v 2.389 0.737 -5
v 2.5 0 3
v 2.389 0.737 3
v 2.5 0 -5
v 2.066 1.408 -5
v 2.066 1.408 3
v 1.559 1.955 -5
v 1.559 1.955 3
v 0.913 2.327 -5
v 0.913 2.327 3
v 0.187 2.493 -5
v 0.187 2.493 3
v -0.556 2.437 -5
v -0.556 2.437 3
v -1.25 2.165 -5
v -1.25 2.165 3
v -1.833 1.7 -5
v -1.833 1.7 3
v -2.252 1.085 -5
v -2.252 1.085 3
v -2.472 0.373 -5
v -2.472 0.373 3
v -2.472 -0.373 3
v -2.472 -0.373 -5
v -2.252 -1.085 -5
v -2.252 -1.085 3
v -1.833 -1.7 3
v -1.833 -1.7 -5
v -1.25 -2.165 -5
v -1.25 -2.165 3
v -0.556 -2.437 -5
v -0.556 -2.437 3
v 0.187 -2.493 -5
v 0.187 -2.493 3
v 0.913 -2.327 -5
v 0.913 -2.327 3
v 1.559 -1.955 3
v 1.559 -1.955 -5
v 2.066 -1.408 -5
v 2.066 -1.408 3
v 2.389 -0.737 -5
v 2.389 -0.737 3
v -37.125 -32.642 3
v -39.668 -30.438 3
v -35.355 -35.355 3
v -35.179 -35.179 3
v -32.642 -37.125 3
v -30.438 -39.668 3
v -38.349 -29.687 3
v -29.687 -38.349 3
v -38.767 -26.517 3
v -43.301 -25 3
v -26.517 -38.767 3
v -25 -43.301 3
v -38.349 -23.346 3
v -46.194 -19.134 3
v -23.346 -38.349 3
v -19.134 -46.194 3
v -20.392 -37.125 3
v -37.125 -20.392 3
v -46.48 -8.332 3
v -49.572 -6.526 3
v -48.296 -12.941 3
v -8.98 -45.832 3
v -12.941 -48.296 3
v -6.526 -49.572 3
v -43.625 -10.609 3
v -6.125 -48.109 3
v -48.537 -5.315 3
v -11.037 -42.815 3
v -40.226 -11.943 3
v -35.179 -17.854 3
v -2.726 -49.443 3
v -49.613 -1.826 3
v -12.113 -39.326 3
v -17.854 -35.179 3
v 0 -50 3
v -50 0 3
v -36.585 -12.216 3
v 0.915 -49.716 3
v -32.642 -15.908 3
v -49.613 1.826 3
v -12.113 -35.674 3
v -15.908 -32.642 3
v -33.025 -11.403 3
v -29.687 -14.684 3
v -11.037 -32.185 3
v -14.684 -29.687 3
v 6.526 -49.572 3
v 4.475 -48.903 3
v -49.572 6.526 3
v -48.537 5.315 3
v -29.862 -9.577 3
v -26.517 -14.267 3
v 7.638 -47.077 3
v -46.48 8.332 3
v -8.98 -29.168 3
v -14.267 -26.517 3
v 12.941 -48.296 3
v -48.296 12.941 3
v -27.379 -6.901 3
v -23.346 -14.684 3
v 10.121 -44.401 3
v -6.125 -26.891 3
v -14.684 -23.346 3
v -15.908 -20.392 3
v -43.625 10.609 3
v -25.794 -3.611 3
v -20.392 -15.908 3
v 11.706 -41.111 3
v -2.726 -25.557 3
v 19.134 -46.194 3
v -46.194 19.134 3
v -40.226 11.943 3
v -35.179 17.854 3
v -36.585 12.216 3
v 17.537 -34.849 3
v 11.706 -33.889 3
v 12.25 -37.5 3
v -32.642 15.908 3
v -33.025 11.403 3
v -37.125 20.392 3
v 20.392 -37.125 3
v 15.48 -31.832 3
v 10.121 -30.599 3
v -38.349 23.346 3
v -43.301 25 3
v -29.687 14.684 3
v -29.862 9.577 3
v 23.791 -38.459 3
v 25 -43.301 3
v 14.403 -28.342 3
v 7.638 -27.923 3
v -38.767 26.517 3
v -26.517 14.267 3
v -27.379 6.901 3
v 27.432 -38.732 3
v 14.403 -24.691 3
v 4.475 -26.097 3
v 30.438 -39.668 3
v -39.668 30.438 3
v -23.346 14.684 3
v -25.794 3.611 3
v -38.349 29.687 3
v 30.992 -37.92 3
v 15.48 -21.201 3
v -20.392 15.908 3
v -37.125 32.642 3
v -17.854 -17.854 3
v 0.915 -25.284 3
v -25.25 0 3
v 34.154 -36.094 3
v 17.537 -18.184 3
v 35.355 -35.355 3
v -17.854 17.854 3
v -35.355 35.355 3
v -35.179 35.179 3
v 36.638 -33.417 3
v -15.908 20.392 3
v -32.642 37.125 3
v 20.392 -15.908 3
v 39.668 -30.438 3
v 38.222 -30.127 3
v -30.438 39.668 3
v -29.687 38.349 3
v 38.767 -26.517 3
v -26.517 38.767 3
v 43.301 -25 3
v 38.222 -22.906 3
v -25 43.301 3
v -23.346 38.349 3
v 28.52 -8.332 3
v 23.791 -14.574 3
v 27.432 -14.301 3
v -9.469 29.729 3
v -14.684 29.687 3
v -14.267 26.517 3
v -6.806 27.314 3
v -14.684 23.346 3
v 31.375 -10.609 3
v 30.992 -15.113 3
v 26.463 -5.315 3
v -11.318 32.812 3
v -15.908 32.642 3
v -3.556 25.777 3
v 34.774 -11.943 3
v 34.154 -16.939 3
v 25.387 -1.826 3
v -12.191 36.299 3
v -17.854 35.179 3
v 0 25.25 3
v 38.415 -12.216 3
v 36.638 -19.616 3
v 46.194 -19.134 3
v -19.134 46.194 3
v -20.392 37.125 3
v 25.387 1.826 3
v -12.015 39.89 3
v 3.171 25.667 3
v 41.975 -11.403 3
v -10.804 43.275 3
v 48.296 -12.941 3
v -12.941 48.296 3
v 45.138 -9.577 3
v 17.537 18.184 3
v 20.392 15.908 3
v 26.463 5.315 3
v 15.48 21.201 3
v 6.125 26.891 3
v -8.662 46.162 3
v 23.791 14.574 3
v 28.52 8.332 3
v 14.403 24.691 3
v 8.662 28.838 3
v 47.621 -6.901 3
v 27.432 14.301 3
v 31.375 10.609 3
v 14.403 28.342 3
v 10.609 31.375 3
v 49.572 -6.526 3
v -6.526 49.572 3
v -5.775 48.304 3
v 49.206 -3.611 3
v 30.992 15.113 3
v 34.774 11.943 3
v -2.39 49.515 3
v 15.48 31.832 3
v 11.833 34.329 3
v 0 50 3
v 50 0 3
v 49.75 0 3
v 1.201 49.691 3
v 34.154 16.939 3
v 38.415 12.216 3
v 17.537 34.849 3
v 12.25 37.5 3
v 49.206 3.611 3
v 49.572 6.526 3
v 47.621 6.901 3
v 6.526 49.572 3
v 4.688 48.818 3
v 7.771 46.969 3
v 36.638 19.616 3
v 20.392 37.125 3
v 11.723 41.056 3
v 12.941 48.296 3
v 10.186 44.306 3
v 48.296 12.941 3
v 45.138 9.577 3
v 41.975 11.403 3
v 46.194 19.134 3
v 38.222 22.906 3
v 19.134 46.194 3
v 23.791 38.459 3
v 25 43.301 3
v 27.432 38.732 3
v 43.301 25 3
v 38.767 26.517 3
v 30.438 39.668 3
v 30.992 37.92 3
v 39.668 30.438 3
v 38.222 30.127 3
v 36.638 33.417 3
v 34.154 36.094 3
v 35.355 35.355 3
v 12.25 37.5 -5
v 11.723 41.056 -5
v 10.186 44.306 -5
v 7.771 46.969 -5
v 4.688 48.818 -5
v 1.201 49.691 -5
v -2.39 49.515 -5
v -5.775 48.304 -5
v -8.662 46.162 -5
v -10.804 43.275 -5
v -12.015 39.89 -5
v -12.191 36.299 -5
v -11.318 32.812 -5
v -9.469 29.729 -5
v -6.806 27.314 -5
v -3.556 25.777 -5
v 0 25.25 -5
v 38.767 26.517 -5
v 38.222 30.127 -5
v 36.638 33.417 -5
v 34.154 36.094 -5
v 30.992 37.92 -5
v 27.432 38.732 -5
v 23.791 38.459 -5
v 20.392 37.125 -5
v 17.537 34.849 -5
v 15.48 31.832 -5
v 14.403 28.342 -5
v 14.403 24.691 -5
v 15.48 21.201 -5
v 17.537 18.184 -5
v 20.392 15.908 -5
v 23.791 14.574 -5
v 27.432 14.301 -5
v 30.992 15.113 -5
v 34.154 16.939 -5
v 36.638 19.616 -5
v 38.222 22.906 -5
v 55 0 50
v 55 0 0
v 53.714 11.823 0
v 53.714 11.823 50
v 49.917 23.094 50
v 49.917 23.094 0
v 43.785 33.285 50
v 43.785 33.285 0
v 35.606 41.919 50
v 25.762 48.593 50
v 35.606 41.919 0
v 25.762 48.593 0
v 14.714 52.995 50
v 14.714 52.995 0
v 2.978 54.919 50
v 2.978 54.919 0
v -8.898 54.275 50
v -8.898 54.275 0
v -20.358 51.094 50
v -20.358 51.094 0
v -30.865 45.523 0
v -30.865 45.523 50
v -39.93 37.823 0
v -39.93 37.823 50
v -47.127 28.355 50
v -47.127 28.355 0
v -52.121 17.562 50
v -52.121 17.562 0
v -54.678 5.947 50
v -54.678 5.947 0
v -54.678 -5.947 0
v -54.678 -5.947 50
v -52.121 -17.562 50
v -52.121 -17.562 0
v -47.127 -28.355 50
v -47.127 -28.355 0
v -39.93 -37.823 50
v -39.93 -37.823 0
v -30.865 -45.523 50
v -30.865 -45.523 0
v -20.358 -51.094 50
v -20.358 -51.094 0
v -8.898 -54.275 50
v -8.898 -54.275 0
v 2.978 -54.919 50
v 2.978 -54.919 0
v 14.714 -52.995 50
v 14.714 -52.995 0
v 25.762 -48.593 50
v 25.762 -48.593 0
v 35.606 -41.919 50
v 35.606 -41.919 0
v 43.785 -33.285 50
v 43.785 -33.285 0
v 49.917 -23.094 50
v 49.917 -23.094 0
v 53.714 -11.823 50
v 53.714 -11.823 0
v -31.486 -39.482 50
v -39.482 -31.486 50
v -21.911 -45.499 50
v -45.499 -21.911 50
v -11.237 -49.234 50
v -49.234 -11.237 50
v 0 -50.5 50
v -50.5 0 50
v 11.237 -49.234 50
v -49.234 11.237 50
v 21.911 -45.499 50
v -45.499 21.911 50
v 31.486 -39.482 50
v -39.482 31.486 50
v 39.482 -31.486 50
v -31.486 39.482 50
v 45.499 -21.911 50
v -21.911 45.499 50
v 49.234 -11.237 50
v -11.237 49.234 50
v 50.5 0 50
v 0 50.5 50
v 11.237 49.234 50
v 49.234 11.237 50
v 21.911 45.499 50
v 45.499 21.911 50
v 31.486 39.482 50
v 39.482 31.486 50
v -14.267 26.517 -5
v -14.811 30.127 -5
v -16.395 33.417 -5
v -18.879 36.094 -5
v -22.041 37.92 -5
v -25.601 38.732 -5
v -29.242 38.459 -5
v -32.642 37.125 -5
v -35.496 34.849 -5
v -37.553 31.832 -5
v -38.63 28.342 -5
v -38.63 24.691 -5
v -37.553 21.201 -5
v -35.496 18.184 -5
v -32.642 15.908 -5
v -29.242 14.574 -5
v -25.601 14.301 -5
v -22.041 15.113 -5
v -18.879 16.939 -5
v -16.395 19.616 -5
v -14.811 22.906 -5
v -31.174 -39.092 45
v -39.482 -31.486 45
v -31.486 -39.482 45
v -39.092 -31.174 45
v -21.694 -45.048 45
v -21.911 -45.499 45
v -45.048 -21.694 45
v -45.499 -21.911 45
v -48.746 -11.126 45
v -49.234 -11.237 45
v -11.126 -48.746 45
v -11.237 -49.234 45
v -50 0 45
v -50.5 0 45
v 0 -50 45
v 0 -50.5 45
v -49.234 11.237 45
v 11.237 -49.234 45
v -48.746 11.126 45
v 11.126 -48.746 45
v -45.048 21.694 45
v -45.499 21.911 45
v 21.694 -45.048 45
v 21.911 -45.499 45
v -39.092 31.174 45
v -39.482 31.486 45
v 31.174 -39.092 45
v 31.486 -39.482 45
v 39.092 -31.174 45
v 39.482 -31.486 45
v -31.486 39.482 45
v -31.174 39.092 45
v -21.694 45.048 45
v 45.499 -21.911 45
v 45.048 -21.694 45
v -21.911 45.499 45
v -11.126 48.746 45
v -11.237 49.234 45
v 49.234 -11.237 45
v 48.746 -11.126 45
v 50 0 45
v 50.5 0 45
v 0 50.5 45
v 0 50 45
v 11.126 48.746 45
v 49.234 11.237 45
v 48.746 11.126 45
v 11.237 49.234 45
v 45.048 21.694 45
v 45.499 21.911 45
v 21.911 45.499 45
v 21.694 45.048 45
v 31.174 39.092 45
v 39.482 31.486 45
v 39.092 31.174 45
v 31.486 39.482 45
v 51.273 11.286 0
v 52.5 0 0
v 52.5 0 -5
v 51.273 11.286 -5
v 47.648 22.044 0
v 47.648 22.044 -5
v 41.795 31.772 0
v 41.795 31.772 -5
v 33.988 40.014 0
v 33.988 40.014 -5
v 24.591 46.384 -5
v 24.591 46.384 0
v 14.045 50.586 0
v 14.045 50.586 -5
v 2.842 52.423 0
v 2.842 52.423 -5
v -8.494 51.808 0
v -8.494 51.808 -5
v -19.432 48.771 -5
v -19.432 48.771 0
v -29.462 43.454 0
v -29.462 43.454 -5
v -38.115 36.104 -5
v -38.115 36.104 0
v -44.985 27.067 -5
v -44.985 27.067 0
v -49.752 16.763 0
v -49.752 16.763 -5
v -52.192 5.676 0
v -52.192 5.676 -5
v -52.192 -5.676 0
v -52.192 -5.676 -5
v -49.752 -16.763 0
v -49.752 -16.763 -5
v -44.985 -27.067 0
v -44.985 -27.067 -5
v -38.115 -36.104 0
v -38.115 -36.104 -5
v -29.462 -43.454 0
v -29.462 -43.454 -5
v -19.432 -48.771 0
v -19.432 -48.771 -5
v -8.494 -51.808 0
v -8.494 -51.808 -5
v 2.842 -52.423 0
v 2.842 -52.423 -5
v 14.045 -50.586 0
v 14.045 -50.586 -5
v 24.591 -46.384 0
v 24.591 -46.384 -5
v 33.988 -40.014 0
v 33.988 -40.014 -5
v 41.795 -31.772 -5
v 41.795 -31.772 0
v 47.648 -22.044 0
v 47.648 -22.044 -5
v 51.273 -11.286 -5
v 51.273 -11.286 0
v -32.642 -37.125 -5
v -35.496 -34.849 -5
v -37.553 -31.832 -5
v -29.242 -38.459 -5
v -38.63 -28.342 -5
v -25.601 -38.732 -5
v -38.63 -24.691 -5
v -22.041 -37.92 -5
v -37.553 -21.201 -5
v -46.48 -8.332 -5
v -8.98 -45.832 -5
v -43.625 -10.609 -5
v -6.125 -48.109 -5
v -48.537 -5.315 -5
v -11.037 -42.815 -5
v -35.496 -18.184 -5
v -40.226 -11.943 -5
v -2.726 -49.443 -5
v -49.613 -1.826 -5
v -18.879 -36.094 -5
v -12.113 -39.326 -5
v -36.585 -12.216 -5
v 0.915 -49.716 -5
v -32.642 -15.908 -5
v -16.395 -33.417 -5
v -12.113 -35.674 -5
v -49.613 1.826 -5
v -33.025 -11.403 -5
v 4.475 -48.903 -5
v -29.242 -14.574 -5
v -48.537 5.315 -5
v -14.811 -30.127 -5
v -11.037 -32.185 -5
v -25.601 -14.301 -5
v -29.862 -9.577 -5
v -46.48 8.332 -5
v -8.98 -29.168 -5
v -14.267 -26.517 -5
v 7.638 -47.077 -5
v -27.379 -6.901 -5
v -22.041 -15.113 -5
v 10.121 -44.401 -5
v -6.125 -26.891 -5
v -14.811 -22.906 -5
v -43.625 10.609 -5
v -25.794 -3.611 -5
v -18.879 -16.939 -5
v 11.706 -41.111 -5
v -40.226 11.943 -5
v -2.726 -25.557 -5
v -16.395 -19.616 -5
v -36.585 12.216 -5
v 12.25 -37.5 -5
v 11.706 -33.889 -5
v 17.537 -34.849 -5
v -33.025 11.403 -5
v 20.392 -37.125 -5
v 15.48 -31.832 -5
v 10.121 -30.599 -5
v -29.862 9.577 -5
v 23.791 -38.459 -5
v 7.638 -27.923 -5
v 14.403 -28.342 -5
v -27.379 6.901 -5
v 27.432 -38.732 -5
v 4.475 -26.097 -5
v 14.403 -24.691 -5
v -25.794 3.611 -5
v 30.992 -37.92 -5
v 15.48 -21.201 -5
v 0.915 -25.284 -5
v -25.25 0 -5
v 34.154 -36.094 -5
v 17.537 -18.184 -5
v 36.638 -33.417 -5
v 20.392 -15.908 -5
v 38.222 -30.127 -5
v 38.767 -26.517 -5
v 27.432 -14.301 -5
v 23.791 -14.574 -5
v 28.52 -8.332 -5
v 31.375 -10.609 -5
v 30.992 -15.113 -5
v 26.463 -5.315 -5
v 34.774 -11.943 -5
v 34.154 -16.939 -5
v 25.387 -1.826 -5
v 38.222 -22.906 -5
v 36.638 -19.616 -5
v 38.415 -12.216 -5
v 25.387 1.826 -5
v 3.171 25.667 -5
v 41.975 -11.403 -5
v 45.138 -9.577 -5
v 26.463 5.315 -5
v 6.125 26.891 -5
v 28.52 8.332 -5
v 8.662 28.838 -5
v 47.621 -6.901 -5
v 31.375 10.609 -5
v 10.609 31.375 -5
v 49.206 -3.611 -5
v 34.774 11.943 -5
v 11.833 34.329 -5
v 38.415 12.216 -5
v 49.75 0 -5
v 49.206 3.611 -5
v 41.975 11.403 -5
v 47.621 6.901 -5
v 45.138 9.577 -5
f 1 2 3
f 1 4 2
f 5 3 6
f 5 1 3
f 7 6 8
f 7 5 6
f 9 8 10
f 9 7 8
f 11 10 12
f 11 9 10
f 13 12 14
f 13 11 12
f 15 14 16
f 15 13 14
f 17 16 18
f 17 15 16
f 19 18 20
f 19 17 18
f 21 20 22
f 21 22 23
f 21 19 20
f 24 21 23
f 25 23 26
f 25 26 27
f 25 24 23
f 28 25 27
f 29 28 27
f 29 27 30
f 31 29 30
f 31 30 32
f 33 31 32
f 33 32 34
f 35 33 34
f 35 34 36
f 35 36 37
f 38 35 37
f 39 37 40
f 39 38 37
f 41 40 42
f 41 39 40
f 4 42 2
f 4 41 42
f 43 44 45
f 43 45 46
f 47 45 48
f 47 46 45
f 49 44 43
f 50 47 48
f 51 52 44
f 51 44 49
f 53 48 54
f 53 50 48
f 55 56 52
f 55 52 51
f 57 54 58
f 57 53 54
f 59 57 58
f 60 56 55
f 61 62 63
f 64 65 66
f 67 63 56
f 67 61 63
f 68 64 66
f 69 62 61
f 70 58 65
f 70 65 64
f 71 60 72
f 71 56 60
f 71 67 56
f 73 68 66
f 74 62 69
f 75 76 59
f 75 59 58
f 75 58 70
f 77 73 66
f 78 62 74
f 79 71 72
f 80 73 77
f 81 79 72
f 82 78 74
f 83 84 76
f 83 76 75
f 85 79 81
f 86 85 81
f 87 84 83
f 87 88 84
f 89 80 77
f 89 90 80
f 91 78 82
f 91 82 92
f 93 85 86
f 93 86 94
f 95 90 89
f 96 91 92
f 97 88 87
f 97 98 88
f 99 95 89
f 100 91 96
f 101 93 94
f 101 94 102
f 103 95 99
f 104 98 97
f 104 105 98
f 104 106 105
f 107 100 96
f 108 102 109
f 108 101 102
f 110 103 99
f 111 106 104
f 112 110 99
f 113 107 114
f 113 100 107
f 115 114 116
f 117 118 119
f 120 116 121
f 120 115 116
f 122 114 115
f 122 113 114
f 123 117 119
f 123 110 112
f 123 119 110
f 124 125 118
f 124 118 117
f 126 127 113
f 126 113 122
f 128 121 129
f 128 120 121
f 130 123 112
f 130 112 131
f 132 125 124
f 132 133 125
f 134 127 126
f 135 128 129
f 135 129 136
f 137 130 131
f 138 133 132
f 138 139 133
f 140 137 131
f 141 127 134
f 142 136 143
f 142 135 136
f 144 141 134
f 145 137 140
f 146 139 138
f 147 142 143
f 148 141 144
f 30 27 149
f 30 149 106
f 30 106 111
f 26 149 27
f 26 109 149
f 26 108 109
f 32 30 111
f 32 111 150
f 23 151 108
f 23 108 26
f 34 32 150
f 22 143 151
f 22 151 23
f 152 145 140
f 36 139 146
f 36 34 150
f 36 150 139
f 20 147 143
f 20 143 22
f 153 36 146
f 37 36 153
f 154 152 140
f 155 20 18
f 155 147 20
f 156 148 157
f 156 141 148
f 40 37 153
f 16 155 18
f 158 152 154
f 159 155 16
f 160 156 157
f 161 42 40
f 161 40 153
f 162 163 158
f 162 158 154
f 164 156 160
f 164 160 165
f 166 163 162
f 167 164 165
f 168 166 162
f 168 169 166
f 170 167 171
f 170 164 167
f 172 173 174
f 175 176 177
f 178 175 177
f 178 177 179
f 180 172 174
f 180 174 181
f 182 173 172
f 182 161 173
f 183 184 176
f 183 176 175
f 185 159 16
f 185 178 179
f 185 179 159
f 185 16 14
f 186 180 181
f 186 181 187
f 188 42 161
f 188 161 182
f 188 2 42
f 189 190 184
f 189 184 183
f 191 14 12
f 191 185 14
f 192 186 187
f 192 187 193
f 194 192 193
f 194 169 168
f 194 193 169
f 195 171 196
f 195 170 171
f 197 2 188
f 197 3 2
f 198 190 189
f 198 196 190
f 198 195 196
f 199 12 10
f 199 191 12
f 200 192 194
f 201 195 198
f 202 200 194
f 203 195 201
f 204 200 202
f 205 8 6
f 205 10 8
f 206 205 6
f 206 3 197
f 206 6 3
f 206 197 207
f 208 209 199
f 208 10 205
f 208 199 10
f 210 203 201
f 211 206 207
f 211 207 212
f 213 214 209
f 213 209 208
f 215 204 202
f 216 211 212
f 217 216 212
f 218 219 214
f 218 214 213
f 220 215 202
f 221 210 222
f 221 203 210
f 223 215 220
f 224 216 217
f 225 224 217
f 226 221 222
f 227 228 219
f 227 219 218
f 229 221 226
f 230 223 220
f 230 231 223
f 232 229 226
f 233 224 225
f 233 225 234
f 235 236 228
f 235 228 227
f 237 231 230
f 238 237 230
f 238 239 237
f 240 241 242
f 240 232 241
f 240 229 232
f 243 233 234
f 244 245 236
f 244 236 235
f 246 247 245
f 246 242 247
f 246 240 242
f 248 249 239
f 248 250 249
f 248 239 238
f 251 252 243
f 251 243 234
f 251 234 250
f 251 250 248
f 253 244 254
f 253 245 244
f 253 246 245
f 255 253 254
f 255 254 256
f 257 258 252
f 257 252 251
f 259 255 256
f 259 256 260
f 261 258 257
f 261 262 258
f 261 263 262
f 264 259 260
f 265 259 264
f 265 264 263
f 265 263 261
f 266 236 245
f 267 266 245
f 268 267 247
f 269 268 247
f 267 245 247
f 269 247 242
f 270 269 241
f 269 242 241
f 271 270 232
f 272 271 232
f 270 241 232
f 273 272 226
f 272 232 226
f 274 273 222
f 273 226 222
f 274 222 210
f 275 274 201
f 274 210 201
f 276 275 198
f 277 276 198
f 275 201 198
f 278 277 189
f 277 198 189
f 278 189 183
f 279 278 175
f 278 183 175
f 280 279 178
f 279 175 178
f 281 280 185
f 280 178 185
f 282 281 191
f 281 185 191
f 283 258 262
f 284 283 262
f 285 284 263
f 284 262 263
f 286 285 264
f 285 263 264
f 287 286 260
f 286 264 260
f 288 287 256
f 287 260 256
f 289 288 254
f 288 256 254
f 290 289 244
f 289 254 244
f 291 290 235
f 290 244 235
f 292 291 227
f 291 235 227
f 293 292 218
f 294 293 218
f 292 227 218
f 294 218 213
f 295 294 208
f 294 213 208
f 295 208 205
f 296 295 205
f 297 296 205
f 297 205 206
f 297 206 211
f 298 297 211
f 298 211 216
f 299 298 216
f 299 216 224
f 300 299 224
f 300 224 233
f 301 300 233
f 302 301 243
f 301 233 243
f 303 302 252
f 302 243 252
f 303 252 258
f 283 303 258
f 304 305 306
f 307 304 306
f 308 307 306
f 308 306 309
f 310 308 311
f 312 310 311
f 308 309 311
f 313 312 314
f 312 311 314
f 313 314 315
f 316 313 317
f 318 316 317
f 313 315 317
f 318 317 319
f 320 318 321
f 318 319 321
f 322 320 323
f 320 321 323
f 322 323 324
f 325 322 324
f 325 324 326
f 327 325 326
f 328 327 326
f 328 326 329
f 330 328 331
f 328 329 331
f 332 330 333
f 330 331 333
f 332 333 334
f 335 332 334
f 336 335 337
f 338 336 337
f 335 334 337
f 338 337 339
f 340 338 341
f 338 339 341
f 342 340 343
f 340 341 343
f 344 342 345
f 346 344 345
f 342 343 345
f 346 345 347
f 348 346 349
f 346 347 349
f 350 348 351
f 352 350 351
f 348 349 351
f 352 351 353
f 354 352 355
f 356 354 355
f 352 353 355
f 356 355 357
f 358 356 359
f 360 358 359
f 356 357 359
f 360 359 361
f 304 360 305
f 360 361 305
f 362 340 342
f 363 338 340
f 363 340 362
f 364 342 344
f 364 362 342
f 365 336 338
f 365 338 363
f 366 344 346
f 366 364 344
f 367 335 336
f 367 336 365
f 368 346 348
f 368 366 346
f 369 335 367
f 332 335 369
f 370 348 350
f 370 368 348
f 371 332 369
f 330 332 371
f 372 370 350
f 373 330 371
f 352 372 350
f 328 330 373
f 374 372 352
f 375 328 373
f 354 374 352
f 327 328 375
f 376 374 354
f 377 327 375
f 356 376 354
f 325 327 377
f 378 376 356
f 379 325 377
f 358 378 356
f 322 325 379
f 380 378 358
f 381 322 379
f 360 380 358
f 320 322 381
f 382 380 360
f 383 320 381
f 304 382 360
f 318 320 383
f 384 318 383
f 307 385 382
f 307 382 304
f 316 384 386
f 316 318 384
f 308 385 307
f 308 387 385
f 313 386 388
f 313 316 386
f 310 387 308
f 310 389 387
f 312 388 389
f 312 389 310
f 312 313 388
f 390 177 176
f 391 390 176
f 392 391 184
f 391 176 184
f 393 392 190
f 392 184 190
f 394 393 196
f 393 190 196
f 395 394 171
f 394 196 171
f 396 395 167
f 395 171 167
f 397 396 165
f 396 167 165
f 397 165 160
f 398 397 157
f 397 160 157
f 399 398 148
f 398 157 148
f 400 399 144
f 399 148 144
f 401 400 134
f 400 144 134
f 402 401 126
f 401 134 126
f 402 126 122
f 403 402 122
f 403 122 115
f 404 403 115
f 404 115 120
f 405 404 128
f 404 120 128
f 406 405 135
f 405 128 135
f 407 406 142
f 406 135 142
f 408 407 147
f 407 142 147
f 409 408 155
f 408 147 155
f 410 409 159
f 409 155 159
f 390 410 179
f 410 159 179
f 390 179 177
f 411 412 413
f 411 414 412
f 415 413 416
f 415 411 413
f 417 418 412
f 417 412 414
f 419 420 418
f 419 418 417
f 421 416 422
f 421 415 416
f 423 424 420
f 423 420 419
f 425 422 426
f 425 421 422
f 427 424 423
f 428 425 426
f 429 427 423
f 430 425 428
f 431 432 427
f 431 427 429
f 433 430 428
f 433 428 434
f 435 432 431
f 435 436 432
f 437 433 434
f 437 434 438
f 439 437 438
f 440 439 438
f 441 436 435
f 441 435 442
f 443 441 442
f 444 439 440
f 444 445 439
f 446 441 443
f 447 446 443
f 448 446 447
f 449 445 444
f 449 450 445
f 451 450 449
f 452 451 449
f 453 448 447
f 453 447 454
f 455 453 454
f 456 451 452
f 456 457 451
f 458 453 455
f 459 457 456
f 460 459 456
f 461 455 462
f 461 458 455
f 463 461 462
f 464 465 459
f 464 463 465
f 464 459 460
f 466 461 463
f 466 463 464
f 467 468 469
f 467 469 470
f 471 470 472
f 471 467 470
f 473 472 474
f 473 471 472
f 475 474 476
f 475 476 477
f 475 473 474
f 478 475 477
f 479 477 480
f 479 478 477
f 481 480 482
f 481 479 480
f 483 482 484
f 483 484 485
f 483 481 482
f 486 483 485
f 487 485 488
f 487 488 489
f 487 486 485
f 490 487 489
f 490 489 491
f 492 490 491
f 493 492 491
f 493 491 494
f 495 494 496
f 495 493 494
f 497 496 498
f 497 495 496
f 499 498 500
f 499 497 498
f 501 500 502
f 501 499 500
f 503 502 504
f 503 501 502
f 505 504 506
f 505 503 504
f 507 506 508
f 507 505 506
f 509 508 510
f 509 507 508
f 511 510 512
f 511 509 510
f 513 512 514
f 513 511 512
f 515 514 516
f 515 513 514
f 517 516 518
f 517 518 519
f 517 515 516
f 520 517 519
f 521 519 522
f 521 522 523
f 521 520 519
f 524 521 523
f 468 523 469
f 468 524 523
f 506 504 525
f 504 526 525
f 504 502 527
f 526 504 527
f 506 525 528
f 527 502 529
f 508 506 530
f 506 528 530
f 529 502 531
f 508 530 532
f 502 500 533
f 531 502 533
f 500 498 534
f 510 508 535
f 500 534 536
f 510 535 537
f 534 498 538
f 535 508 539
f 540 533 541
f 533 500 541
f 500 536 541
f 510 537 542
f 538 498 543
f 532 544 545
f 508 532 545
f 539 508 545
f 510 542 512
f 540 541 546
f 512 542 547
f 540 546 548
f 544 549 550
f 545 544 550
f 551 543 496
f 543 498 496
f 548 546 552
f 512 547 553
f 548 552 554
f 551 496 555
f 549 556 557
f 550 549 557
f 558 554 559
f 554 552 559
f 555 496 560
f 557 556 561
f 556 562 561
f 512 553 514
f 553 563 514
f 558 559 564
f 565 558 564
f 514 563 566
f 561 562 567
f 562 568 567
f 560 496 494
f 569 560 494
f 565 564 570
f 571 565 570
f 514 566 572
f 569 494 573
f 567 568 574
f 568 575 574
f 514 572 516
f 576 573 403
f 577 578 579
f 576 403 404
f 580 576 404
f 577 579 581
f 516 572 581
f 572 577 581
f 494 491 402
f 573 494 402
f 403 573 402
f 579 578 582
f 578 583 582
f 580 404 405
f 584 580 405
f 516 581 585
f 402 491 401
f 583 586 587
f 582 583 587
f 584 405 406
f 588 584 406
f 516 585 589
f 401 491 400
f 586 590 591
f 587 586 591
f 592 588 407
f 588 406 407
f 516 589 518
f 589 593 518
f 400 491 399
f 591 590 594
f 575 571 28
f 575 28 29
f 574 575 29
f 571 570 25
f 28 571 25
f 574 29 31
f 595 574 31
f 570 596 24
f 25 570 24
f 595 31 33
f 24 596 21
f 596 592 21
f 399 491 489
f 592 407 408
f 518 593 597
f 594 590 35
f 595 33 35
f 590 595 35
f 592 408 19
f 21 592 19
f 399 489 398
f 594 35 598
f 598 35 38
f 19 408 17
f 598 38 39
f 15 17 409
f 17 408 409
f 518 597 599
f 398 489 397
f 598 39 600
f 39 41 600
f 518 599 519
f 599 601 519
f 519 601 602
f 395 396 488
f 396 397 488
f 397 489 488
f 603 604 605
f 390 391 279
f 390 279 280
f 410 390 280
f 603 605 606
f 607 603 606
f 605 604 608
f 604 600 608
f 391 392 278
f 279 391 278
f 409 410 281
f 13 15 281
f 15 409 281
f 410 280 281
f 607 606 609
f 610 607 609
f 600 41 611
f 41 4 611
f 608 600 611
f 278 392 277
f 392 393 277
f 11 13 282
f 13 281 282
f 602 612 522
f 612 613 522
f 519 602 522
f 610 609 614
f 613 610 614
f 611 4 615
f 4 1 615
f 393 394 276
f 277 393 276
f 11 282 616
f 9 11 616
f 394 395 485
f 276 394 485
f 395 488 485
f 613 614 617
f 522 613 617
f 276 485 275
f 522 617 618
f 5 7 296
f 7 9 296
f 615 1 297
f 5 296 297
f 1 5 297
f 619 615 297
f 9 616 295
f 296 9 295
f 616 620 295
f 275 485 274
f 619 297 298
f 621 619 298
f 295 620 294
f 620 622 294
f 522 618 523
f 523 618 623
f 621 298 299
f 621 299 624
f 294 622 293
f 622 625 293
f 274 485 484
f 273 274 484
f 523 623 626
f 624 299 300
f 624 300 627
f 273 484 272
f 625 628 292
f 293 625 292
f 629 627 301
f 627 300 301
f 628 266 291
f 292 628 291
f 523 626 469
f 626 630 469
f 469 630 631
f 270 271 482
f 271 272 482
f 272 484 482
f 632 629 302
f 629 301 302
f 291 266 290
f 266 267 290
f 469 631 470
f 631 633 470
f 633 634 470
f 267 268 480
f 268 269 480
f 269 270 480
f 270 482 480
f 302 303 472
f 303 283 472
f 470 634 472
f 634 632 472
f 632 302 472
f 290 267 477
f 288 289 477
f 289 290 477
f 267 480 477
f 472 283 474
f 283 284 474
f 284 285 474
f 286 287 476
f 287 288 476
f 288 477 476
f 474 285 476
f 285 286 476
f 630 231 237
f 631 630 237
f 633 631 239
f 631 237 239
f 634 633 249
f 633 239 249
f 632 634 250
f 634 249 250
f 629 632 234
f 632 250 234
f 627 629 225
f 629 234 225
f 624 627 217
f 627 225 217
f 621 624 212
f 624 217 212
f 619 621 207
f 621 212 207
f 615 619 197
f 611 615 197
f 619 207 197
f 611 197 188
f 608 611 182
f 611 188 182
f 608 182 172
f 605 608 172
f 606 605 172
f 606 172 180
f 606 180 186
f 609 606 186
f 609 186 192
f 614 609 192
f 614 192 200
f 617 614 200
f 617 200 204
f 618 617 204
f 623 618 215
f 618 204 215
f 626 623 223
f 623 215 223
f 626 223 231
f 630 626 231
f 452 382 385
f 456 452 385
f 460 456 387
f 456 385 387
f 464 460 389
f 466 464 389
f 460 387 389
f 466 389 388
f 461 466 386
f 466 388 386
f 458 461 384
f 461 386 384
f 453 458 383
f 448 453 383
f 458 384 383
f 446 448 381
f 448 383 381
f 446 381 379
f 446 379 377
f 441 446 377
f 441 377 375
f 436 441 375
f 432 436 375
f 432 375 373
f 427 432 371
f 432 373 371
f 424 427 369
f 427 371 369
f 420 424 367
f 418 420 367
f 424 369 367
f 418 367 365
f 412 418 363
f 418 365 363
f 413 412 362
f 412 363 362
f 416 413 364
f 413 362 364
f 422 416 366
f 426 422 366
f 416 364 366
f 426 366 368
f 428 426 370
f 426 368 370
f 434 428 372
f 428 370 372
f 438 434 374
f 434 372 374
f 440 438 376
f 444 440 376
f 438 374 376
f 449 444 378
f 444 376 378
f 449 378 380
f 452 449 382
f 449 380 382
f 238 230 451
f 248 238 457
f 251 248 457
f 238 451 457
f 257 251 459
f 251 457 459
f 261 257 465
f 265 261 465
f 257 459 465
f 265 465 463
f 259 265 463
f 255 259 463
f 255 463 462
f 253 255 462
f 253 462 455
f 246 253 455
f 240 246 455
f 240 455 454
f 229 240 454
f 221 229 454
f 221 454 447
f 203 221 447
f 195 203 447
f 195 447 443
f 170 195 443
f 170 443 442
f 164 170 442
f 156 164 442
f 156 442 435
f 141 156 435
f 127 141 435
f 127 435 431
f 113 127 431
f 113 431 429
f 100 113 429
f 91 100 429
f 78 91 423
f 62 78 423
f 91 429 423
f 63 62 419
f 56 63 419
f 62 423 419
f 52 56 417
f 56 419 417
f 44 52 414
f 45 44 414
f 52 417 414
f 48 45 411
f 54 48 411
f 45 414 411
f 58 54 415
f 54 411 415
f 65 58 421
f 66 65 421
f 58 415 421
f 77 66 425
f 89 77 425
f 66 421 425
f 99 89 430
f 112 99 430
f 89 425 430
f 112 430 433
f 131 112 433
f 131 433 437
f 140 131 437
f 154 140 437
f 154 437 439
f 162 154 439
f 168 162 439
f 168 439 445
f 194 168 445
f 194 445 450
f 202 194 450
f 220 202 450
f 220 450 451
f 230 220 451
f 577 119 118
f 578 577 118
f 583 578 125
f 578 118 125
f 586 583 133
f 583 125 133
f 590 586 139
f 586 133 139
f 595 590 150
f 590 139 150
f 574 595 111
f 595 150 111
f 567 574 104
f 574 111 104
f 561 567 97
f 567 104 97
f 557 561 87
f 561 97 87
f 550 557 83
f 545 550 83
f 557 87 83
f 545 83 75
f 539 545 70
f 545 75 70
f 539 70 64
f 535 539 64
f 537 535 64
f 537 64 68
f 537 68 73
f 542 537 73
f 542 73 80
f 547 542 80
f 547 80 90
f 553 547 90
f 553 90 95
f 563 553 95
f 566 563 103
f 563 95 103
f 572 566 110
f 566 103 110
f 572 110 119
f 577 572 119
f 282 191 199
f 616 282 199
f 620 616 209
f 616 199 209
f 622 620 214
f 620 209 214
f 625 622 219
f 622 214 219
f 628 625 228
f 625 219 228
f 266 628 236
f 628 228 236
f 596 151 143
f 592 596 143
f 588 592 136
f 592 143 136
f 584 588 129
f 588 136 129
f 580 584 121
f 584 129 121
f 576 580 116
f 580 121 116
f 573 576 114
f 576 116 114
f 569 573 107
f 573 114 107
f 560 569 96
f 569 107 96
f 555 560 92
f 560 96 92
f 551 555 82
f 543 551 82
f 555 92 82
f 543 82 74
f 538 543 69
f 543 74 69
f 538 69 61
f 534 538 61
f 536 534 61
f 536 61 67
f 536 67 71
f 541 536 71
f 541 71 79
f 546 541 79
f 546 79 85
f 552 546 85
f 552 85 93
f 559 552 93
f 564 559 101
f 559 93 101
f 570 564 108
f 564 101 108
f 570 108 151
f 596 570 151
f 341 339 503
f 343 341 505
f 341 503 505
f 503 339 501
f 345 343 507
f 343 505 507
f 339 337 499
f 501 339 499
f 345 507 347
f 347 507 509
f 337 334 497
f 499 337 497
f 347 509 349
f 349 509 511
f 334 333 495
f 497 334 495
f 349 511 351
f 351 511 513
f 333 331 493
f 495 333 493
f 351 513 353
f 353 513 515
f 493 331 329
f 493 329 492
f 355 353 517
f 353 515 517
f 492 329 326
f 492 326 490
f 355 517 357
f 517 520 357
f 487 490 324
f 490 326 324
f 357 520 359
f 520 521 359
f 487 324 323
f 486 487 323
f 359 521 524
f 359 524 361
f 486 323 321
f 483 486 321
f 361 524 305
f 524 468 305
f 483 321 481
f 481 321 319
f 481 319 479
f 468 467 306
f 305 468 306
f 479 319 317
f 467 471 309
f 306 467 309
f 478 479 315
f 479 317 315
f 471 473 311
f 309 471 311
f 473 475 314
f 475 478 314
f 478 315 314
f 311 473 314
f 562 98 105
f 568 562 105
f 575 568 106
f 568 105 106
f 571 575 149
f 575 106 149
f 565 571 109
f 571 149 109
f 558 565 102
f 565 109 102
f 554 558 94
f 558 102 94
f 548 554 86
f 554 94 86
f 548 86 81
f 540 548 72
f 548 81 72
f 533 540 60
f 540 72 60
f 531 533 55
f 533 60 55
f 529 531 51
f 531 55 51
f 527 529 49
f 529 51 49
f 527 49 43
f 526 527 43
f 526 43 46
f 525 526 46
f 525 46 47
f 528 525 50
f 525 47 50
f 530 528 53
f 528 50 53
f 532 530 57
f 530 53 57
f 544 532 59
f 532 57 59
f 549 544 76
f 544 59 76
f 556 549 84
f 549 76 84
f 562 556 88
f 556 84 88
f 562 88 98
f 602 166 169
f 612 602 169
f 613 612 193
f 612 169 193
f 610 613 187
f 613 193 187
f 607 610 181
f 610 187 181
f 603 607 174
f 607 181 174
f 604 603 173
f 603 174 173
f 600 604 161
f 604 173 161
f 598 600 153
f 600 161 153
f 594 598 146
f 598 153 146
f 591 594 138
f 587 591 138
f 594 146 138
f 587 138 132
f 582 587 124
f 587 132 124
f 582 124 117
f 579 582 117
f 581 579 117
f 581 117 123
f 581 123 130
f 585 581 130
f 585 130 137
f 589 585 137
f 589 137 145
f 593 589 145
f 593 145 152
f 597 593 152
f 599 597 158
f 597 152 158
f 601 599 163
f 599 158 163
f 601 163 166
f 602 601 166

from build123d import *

# Parameters (mm, degrees)
F0_R        = 52.5
F0_R_2      = 2.5
F1_DEPTH    = 5
F0_R_3      = 55
F1_FACE_R   = 52.5
F1_FACE_R_2 = 2.5
F2_DEPTH    = 50
F3_R        = 50
F3_R_2      = 2.5
F4_DEPTH    = 47
F5_R        = 12.25
F6_DEPTH    = 8
F7_R        = 50.5
F7_R_2      = 50
F8_DEPTH    = 5


with BuildPart() as f1:
    # F0 (on Top) → F1 (new body)
    with BuildSketch(Plane.XY):
        Circle(F0_R)
        Circle(F0_R_2, mode=Mode.SUBTRACT)
    extrude(amount=-F1_DEPTH)

    # F0 (on Top) + F1_face (on face) → F2 (join)
    with BuildSketch(Plane.XY):
        Circle(F0_R_3)
        Circle(F0_R, mode=Mode.SUBTRACT)
    with BuildSketch(Plane.XY):
        Circle(F1_FACE_R)
        Circle(F1_FACE_R_2, mode=Mode.SUBTRACT)
    extrude(amount=F2_DEPTH)

    # F3 (on face) → F4 (cut)
    with BuildSketch(Plane.XY.offset(50)):
        Circle(F3_R)
        Circle(F3_R_2, mode=Mode.SUBTRACT)
    extrude(amount=-F4_DEPTH, mode=Mode.SUBTRACT)

    # F5 (on face) → F6 (cut)
    with BuildSketch(Plane.XY.offset(3)):
        with BuildLine():
            ThreePointArc((0, 25.25), (8.662058, 28.837942), (12.25, 37.5))
            ThreePointArc((12.25, 37.5), (-8.662058, 46.162058), (0, 25.25))
        make_face()
        with Locations((-26.516504, 26.516504)):
            Circle(F5_R)
        with Locations((-37.5, 0)):
            Circle(F5_R)
        with Locations((-26.516504, -26.516504)):
            Circle(F5_R)
        with Locations((0, -37.5)):
            Circle(F5_R)
        with Locations((26.516504, -26.516504)):
            Circle(F5_R)
        with Locations((26.516504, 26.516504)):
            Circle(F5_R)
        with Locations((37.5, 0)):
            Circle(F5_R)
    extrude(amount=-F6_DEPTH, mode=Mode.SUBTRACT)

    # F7 (on face) → F8 (cut)
    with BuildSketch(Plane.XY.offset(50)):
        Circle(F7_R)
        Circle(F7_R_2, mode=Mode.SUBTRACT)
    extrude(amount=-F8_DEPTH, mode=Mode.SUBTRACT)


solid = f1.part
